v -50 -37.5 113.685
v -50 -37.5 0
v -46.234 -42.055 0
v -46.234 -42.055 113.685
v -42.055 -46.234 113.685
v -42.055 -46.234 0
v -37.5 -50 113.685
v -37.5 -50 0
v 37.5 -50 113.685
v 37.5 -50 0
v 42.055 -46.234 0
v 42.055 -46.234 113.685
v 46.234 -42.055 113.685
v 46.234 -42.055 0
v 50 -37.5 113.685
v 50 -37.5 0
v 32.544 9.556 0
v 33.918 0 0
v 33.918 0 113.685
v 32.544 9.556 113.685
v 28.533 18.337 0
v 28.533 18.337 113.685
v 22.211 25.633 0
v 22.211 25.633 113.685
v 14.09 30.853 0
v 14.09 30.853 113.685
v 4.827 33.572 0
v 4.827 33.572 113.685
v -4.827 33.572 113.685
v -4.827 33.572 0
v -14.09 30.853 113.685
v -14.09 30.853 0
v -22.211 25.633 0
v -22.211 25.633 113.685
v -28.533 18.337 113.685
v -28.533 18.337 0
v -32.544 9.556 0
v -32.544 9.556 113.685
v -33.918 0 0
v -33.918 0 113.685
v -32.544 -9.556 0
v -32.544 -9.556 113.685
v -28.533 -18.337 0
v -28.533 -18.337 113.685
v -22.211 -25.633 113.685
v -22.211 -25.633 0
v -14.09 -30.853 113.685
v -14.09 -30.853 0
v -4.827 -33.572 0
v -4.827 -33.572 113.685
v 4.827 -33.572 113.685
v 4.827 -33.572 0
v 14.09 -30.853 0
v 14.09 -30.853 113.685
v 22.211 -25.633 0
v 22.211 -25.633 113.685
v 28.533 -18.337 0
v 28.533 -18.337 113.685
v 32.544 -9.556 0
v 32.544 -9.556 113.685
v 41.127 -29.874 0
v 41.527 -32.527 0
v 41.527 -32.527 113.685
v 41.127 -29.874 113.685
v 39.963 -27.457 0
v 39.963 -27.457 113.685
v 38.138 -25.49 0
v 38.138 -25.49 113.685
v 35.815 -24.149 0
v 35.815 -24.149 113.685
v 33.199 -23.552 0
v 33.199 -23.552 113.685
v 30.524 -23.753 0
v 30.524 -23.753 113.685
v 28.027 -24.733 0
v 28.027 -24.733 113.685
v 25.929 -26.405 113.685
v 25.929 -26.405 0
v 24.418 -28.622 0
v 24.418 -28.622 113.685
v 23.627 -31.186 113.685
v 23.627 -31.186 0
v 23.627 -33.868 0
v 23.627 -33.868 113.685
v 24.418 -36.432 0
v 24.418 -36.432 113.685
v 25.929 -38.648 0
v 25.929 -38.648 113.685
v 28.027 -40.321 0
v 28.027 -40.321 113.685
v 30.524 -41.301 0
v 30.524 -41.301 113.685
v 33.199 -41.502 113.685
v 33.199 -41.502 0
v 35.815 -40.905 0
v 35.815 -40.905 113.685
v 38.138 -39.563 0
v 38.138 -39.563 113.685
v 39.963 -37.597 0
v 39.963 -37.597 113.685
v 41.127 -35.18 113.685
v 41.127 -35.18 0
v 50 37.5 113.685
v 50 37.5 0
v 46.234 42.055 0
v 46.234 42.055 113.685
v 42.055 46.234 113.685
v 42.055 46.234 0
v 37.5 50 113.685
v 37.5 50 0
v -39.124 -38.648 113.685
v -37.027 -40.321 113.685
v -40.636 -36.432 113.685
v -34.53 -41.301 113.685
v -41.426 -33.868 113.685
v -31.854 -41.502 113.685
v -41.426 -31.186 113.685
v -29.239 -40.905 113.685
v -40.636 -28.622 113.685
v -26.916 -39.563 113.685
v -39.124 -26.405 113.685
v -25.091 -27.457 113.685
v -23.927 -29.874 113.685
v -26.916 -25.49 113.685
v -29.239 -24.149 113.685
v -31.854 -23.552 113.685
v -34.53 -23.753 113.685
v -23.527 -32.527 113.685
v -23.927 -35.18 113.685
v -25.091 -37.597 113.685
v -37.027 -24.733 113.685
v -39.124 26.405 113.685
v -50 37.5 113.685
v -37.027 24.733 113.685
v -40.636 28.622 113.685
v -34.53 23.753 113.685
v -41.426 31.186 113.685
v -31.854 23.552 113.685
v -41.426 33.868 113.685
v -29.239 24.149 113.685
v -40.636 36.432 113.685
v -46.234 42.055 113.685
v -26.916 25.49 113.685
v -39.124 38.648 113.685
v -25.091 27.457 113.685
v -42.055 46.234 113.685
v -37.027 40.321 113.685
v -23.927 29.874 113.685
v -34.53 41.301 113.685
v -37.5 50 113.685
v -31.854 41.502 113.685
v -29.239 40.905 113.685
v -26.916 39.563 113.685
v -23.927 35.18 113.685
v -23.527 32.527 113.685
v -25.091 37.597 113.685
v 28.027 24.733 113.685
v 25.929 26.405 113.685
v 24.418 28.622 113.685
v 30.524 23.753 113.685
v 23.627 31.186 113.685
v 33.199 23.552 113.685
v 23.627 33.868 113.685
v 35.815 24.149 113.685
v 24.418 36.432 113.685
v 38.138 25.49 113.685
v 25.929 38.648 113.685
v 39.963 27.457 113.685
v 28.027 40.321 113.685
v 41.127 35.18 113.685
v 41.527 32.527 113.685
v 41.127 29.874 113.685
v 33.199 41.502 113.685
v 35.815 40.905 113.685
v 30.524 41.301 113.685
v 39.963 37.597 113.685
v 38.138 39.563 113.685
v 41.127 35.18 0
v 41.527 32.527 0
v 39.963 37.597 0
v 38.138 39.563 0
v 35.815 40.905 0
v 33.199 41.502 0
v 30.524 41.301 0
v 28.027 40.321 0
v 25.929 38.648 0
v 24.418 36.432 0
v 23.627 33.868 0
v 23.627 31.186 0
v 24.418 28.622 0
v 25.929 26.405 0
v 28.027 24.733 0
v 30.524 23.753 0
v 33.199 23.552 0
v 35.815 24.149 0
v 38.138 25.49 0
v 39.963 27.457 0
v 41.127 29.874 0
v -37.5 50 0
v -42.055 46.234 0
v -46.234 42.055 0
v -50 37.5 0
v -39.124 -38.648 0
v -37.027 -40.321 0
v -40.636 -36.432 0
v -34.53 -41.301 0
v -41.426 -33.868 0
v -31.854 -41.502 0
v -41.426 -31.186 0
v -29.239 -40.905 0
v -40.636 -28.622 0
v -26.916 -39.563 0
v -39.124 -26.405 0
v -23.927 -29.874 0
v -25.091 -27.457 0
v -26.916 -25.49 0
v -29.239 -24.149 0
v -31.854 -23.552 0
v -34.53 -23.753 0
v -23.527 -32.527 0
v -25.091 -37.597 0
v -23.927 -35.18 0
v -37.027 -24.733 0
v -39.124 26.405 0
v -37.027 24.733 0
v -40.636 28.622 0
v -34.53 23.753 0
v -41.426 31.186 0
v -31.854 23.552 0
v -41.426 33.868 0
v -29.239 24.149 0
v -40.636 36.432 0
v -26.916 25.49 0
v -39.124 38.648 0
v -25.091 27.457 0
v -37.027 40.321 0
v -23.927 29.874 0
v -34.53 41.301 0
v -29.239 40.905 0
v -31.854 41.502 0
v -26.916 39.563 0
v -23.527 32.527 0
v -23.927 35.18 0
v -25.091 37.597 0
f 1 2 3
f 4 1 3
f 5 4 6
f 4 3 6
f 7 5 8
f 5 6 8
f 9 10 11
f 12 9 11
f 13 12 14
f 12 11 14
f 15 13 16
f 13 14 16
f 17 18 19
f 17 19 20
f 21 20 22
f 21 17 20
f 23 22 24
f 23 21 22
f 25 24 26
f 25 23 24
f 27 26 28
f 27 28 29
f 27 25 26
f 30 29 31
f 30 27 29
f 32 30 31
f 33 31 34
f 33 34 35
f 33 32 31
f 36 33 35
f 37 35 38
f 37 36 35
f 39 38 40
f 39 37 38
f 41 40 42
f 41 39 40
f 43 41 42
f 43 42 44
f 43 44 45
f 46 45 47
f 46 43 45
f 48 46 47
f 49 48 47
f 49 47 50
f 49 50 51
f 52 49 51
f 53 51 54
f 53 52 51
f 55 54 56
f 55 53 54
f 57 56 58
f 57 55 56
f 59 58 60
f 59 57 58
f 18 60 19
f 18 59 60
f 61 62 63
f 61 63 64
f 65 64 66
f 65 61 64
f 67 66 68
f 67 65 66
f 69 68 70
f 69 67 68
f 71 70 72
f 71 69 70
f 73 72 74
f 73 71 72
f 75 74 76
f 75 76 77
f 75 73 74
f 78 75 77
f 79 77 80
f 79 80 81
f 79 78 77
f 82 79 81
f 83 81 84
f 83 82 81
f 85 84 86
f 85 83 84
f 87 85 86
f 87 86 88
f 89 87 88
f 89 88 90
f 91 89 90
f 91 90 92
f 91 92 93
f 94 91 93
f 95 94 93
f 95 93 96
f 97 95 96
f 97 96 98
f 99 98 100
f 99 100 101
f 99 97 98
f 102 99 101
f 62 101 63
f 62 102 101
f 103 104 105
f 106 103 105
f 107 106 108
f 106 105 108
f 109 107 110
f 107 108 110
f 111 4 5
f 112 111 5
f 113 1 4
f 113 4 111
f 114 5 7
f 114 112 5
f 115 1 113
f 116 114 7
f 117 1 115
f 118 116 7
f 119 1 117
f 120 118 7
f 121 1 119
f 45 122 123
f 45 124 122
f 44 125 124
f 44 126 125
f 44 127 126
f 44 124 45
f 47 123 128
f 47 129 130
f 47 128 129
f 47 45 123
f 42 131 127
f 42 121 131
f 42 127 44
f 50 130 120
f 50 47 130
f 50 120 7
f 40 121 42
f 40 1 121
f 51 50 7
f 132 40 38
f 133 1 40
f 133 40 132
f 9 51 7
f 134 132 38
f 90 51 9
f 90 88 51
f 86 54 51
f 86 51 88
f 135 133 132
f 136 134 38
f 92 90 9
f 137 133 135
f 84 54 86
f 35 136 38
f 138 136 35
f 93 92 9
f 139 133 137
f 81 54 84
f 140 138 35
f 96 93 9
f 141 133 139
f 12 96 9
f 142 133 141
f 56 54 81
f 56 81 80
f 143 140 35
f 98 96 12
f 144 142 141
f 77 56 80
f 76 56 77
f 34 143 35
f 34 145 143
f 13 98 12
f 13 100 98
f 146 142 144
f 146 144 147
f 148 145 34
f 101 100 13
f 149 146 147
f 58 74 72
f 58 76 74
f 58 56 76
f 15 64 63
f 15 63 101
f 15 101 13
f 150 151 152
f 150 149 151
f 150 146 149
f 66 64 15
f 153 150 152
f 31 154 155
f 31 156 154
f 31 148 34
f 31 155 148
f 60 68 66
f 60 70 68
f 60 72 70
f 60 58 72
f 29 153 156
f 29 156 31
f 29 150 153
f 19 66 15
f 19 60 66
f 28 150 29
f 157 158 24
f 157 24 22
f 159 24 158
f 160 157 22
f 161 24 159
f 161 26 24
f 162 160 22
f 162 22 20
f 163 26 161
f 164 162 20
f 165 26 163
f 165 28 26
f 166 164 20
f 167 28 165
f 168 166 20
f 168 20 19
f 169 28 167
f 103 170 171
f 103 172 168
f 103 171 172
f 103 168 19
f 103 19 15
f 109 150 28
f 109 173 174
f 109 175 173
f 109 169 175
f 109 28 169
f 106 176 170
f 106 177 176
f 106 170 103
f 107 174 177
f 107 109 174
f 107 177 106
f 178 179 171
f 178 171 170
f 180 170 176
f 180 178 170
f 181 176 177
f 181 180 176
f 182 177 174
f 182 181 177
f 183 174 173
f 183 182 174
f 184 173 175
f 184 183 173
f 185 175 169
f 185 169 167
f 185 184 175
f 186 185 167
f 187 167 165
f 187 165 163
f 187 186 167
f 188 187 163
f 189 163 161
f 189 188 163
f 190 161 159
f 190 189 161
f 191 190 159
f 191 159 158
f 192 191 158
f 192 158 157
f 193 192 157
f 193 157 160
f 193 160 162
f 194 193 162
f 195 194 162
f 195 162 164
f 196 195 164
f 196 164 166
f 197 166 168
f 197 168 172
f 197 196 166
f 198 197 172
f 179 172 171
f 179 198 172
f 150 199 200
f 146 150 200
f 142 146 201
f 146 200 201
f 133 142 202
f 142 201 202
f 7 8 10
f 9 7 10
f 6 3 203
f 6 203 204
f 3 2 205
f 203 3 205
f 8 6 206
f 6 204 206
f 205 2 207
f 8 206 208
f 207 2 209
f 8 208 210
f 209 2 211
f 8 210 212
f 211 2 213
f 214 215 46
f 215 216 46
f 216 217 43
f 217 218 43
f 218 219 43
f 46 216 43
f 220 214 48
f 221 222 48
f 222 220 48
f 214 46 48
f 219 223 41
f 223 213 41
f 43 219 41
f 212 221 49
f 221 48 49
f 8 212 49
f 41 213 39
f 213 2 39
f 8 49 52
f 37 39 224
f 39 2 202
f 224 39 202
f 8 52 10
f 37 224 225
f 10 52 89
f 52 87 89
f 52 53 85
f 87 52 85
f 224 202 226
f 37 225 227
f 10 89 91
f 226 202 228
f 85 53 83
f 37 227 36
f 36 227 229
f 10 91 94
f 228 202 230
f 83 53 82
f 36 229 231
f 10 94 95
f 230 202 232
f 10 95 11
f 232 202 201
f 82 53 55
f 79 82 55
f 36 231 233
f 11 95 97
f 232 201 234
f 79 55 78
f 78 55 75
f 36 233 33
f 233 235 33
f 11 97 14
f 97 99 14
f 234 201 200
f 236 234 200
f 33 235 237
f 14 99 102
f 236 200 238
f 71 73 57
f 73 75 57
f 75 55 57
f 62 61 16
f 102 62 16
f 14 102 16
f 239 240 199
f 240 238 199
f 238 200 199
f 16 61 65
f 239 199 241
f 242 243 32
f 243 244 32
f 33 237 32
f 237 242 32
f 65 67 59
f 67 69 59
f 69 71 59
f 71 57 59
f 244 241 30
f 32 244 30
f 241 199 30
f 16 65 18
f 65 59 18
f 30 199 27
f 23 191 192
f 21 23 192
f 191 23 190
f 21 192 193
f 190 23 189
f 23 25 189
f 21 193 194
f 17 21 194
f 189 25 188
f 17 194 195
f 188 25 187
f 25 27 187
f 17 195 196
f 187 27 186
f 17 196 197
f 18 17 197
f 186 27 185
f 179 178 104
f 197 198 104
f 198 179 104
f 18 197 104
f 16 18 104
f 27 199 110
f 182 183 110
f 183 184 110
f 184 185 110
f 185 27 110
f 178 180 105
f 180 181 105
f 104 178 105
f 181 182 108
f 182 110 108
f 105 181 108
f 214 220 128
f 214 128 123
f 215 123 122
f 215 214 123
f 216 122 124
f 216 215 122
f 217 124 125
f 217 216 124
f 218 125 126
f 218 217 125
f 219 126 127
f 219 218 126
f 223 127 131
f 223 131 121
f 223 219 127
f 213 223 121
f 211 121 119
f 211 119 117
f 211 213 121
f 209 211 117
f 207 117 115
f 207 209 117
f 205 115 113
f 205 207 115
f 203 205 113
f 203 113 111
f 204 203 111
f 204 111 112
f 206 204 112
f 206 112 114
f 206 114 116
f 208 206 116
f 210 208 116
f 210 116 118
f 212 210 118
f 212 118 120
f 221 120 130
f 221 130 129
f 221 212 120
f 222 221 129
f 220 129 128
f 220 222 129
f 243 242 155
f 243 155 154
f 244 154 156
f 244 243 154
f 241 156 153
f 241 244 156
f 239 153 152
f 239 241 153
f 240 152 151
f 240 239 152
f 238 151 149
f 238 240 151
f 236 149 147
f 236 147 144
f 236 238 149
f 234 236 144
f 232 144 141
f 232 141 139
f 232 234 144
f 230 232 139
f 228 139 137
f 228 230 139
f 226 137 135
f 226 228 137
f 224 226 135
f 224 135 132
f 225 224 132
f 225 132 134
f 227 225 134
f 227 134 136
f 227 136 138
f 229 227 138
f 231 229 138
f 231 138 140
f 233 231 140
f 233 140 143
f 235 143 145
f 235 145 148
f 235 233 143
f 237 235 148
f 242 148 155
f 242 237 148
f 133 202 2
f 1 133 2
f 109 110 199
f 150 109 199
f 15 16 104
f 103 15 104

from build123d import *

# Parameters (mm, degrees)
SKETCH_1_R          = 9
EXTRUDE_1_DEPTH     = 113.684766057
EXTRUDE_START       = -113.684766057
EXTRUDE_3_OUTLINE_R = 33.917711518
EXTRUDE_3_DEPTH     = 113.684766057


# Read off the part's stored shape, not the designer's step: Вырез-Вытянуть3
with BuildPart() as part:
    # Эскиз1 → Бобышка-Вытянуть1 (new body)
    with BuildSketch(Plane.XY):
        with BuildLine():
            ThreePointArc((-50, -37.5), (-44.194173824, -44.194173824), (-37.5, -50))
            Line((-37.5, -50), (37.5, -50))
            ThreePointArc((37.5, -50), (44.194173824, -44.194173824), (50, -37.5))
            Line((50, -37.5), (50, 37.5))
            ThreePointArc((50, 37.5), (44.194173824, 44.194173824), (37.5, 50))
            Line((37.5, 50), (-37.5, 50))
            ThreePointArc((-37.5, 50), (-44.194173824, 44.194173824), (-50, 37.5))
            Line((-50, 37.5), (-50, -37.5))
        make_face()
        with Locations((-32.526911935, -32.526911935)):
            Circle(SKETCH_1_R, mode=Mode.SUBTRACT)
        with Locations((32.526911935, -32.526911935)):
            Circle(SKETCH_1_R, mode=Mode.SUBTRACT)
        with Locations((-32.526911935, 32.526911935)):
            Circle(SKETCH_1_R, mode=Mode.SUBTRACT)
        with Locations((32.526911935, 32.526911935)):
            Circle(SKETCH_1_R, mode=Mode.SUBTRACT)
    extrude(amount=EXTRUDE_1_DEPTH)

    # Вырез-Вытянуть3 outline → Вырез-Вытянуть3 (cut)
    with BuildSketch(Plane.XY.offset(113.684766057).offset(EXTRUDE_START)):
        Circle(EXTRUDE_3_OUTLINE_R)
    extrude(amount=EXTRUDE_3_DEPTH, mode=Mode.SUBTRACT)


solid = part.part
